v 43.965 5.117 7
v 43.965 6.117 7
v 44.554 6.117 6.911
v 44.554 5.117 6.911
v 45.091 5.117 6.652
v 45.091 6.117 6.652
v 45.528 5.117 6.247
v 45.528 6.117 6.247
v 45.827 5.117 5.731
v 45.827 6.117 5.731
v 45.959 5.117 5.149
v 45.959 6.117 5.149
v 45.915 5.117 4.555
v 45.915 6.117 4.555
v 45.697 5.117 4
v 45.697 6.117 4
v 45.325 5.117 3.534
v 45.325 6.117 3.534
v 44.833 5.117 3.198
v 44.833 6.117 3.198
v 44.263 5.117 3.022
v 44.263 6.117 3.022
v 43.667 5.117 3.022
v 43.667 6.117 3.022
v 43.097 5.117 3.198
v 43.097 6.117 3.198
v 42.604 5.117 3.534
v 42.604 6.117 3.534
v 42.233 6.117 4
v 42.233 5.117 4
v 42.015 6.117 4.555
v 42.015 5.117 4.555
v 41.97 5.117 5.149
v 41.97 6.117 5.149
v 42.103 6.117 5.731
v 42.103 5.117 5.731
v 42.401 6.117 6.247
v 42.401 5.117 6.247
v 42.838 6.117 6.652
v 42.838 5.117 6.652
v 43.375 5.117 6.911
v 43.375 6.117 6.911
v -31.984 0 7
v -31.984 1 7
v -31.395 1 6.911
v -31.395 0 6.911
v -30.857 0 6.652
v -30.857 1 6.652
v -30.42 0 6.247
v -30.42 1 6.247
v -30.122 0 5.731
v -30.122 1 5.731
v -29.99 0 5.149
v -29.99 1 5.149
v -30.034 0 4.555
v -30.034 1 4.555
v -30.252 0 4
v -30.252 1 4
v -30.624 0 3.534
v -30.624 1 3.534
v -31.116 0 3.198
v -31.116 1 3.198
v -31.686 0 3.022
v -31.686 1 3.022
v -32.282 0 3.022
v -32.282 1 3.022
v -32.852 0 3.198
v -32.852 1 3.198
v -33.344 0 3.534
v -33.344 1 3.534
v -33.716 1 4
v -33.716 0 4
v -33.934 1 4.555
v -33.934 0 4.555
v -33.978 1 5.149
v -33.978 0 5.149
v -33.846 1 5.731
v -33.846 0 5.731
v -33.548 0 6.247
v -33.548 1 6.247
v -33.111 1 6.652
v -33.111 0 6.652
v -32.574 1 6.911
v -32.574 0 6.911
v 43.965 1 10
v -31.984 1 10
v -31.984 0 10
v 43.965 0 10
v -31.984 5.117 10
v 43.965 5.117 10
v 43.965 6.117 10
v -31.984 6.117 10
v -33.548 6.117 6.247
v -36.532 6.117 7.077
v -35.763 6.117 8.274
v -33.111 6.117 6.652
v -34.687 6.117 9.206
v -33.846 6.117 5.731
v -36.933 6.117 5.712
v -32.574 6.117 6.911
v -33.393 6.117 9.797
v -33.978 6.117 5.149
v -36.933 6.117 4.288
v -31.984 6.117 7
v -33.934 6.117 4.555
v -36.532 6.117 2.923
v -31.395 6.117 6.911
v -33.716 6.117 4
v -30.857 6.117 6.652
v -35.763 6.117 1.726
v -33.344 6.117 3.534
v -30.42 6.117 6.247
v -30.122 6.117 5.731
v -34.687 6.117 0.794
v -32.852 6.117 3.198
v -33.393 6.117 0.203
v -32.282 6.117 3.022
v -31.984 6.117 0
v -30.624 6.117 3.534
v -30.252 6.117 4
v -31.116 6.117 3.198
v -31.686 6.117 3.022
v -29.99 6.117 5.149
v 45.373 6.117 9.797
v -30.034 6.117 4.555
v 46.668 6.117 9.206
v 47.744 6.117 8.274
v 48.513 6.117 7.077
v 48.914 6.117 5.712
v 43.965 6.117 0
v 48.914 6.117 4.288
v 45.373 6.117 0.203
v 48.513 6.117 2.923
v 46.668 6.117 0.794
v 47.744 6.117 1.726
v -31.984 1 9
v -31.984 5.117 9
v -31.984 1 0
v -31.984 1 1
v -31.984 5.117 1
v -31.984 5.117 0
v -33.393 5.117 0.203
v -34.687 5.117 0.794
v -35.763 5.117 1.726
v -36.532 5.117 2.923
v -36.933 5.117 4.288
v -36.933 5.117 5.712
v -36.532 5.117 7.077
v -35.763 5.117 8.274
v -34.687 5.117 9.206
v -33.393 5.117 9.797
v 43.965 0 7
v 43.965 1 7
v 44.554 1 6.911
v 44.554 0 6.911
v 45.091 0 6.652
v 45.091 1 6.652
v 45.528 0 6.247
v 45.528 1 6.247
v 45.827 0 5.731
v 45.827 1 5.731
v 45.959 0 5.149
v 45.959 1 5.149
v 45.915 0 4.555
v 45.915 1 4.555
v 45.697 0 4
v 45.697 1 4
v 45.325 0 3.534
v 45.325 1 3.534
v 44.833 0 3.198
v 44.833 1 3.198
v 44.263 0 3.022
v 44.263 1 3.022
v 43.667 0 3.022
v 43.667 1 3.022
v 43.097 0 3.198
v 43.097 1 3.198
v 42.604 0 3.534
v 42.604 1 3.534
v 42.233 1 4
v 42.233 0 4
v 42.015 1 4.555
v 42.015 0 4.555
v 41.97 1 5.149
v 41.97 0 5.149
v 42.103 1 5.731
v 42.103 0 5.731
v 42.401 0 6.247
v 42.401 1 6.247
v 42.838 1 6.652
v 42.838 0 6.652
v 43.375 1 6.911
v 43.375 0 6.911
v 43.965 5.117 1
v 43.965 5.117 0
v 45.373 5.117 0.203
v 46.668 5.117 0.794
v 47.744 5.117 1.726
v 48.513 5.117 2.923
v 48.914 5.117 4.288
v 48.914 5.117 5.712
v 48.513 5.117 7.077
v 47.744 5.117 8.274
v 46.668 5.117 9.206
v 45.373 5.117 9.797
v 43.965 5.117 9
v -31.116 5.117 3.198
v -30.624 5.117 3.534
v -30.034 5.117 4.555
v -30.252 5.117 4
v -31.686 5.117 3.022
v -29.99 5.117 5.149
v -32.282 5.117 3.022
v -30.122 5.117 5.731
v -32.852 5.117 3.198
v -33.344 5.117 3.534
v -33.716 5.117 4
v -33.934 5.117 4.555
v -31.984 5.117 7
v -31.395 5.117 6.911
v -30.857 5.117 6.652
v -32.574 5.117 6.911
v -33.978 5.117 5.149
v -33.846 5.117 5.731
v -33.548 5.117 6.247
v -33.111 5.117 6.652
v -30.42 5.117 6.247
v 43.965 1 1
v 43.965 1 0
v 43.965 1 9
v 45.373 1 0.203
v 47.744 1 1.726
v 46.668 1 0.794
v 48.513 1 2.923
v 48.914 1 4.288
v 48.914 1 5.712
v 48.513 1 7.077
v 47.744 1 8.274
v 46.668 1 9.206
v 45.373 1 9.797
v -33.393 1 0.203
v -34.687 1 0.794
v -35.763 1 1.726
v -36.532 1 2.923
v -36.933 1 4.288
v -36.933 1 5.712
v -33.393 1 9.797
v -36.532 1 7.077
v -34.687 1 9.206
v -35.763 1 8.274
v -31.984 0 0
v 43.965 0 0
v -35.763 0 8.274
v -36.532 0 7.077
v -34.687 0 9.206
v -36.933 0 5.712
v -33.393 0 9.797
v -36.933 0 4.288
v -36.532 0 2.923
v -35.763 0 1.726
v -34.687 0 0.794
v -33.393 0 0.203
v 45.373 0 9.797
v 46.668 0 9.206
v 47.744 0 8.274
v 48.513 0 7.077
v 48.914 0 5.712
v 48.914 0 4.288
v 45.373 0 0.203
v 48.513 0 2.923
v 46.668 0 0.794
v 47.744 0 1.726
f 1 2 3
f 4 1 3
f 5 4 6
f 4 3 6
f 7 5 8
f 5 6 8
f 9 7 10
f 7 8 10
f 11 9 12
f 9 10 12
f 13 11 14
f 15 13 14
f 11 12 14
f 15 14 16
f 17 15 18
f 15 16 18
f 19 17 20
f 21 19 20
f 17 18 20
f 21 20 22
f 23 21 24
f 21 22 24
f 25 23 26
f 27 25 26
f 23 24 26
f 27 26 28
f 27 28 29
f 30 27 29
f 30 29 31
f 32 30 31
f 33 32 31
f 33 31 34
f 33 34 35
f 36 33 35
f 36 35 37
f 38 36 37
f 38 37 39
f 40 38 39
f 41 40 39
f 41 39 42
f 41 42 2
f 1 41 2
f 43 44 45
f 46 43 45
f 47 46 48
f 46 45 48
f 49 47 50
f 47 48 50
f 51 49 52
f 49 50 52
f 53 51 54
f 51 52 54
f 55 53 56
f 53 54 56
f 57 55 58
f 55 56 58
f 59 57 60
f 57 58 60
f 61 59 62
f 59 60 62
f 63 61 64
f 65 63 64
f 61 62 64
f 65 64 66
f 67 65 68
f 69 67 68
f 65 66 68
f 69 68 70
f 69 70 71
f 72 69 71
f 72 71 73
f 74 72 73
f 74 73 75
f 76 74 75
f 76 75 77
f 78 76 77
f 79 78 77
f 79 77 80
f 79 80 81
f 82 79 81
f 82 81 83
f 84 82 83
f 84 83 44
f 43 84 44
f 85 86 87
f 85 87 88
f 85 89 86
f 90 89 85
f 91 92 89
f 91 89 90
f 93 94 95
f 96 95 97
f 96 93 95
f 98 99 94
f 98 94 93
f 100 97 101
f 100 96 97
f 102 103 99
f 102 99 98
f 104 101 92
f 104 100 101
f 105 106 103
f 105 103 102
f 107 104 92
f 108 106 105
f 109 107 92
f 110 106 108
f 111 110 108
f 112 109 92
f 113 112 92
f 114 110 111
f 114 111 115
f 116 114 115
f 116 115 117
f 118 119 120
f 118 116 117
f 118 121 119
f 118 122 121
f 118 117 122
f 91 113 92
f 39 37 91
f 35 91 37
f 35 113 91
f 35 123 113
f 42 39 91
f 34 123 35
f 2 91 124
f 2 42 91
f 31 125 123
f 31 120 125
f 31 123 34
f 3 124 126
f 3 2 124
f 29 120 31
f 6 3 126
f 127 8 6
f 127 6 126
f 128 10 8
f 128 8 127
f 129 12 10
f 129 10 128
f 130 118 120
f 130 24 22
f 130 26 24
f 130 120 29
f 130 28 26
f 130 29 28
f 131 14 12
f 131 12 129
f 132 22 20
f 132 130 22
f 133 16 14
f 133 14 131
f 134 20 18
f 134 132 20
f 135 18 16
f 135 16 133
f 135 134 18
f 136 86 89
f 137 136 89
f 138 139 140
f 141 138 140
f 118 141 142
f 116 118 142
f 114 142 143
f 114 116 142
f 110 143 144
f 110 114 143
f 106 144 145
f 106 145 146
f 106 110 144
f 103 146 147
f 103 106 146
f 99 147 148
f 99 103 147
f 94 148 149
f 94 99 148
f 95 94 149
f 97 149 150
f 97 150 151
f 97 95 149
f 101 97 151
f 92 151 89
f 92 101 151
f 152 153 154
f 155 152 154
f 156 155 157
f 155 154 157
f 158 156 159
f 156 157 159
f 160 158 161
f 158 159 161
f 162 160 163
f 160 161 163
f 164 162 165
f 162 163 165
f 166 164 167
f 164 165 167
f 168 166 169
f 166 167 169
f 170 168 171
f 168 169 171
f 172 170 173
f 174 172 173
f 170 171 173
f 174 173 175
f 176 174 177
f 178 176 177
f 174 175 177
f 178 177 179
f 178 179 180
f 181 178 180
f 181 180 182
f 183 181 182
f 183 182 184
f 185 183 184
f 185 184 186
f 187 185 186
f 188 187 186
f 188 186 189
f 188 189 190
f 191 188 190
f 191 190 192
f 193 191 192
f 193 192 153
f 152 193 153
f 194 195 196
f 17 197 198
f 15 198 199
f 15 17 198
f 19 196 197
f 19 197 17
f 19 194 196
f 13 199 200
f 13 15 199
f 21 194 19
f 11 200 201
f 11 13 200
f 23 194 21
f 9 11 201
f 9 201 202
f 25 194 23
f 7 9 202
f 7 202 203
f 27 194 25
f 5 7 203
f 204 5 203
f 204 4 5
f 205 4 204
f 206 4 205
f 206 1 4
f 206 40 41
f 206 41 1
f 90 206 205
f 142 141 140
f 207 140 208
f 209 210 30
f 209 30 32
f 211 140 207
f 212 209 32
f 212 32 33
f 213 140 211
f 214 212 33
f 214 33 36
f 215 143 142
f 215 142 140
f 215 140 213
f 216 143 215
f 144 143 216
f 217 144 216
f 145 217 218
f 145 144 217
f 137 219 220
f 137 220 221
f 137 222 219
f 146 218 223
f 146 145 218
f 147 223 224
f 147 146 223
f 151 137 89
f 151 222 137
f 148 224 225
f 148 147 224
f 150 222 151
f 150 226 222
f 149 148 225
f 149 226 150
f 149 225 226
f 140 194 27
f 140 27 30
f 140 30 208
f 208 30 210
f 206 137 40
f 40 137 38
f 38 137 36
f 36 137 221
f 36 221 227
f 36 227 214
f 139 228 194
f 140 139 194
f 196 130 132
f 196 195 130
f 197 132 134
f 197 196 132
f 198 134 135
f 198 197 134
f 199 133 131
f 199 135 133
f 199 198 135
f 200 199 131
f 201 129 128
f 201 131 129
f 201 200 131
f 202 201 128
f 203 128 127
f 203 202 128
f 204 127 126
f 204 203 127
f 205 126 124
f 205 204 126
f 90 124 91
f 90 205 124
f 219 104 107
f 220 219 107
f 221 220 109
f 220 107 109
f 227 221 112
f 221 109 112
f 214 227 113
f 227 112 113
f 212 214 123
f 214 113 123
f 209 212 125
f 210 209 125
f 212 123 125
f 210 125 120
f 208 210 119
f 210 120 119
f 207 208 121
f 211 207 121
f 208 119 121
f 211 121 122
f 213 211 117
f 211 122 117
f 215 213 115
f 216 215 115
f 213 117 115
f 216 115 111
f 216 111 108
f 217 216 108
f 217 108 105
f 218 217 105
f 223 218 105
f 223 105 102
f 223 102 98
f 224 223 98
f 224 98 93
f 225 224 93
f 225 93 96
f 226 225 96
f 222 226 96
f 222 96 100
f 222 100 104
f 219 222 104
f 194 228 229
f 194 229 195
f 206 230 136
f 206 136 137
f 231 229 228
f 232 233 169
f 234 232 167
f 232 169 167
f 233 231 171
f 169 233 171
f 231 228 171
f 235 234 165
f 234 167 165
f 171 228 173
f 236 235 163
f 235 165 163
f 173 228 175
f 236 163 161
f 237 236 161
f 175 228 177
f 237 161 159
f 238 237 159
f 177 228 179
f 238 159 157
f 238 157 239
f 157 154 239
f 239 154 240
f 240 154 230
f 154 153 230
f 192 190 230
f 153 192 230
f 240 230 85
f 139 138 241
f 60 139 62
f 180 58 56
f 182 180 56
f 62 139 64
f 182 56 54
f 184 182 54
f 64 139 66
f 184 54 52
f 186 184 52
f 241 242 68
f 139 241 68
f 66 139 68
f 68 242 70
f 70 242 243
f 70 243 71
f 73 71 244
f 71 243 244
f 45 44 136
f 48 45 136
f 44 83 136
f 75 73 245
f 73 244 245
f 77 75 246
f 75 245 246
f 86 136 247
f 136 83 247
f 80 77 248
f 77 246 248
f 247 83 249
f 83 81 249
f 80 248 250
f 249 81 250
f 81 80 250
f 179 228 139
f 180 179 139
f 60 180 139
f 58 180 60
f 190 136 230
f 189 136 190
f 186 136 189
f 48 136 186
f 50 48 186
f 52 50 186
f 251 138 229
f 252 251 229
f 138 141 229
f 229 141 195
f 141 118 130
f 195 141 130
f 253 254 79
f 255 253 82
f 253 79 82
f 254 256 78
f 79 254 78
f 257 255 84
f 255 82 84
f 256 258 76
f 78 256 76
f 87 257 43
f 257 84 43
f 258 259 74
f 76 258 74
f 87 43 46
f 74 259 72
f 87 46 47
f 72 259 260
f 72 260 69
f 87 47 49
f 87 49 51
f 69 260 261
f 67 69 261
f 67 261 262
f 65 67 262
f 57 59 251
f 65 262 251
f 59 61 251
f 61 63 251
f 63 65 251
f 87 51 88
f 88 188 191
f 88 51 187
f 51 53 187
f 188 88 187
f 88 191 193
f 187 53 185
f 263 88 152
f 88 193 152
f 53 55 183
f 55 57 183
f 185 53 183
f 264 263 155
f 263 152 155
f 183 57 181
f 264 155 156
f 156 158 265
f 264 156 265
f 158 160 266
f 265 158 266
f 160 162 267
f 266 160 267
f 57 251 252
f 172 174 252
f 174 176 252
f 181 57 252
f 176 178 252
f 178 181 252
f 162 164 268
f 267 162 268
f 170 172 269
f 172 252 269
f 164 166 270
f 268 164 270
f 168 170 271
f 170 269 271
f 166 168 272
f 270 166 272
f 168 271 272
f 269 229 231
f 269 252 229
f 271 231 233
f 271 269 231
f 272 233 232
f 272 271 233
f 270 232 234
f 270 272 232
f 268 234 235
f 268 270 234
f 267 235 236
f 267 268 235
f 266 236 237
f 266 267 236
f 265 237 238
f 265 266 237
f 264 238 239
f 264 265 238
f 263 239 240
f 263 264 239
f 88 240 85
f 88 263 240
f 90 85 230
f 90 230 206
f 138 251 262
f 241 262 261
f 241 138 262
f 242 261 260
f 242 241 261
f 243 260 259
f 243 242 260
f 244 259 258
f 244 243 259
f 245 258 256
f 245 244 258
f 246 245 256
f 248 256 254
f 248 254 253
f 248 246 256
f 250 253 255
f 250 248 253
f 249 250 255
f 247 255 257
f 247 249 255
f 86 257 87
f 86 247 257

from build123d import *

# Parameters (mm, degrees)
SKETCH1_W           = 85.948776221
SKETCH1_H           = 6.116753323
BOSS_EXTRUDE3_DEPTH = 10
FILLET1_RADIUS      = 5
FILLET1_LENGTH      = 6.116753323
FILLET2_RADIUS      = 5
FILLET2_LENGTH      = 6.116753323
SKETCH2_R           = 2
CUT_EXTRUDE1_DEPTH  = 10
SHELL4_START        = -36.984014516
SHELL4_OUTLINE_W    = 4.116753323
SHELL4_OUTLINE_H    = 8
SHELL4_DEPTH        = 85.948776221
SHELL4_START_2      = -36.983829274
SHELL4_2_OUTLINE_W  = 4.116753323
SHELL4_2_OUTLINE_H  = 2
SHELL4_2_DEPTH      = 4.999814758
SHELL4_START_3      = 43.964761705
SHELL4_3_OUTLINE_W  = 4.116753323
SHELL4_3_OUTLINE_H  = 2
SHELL4_3_DEPTH      = 4.999814758


# Read off the part's stored shape, not the designer's step: Shell4
with BuildPart() as part:
    # Sketch1 → Boss-Extrude3 (new body)
    with BuildSketch(Plane.XY):
        with Locations((5.990373594, 3.058376662)):
            Rectangle(SKETCH1_W, SKETCH1_H)
    extrude(amount=BOSS_EXTRUDE3_DEPTH)

    # Fillet1: full round fillet: the end face becomes a half cylinder, R = half its width
    fillet1_face = Plane((48.964761705, 3.058376662, 5), x_dir=(0, -1, 0), z_dir=(1, 0, 0))  # on the end face: x along it, z out of the body
    fillet1_slab = fillet1_face.offset(-FILLET1_RADIUS / 2) * Box(FILLET1_LENGTH, 2 * FILLET1_RADIUS, FILLET1_RADIUS, mode=Mode.PRIVATE)  # the body's end, R deep
    fillet1_round = Plane((43.964761705, 3.058376662, 5), x_dir=(1, 0, 0), z_dir=(0, -1, 0)) * Cylinder(FILLET1_RADIUS, FILLET1_LENGTH, mode=Mode.PRIVATE)  # its axis R under the face
    add(fillet1_slab - fillet1_round, mode=Mode.SUBTRACT)

    # Fillet2: full round fillet: the end face becomes a half cylinder, R = half its width
    fillet2_face = Plane((-36.984014516, 3.058376662, 5), x_dir=(0, 1, 0), z_dir=(-1, 0, 0))  # on the end face: x along it, z out of the body
    fillet2_slab = fillet2_face.offset(-FILLET2_RADIUS / 2) * Box(FILLET2_LENGTH, 2 * FILLET2_RADIUS, FILLET2_RADIUS, mode=Mode.PRIVATE)  # the body's end, R deep
    fillet2_round = Plane((-31.984014516, 3.058376662, 5), x_dir=(-1, 0, 0), z_dir=(0, 1, 0)) * Cylinder(FILLET2_RADIUS, FILLET2_LENGTH, mode=Mode.PRIVATE)  # its axis R under the face
    add(fillet2_slab - fillet2_round, mode=Mode.SUBTRACT)

    # Sketch2 → Cut-Extrude1 (cut)
    with BuildSketch(Plane(origin=(0, 6.116753323, 0), x_dir=(1, 0, 0), z_dir=(0, 1, 0))):
        with Locations(Location((43.964761705, -5, 0), (0, 0, 270))):
            Circle(SKETCH2_R)
        with Locations(Location((-31.984014516, -5, 0), (0, 0, 270))):
            Circle(SKETCH2_R)
    extrude(amount=-CUT_EXTRUDE1_DEPTH, mode=Mode.SUBTRACT)

    # Shell4 outline → Shell4 (cut)
    with BuildSketch(Plane.YZ.offset(SHELL4_START)):
        with Locations((3.058376662, 5)):
            Rectangle(SHELL4_OUTLINE_W, SHELL4_OUTLINE_H)
    extrude(amount=SHELL4_DEPTH, mode=Mode.SUBTRACT)

    # Shell4 2 outline → Shell4 2 (cut)
    with BuildSketch(Plane.YZ.offset(SHELL4_START_2)):
        with Locations((3.058376662, 0)):
            Rectangle(SHELL4_2_OUTLINE_W, SHELL4_2_OUTLINE_H)
        with Locations((3.058376662, 10)):
            Rectangle(SHELL4_2_OUTLINE_W, SHELL4_2_OUTLINE_H)
    extrude(amount=SHELL4_2_DEPTH, mode=Mode.SUBTRACT)

    # Shell4 3 outline → Shell4 3 (cut)
    with BuildSketch(Plane.YZ.offset(SHELL4_START_3)):
        with Locations((3.058376662, 0)):
            Rectangle(SHELL4_3_OUTLINE_W, SHELL4_3_OUTLINE_H)
        with Locations((3.058376662, 10)):
            Rectangle(SHELL4_3_OUTLINE_W, SHELL4_3_OUTLINE_H)
    extrude(amount=SHELL4_3_DEPTH, mode=Mode.SUBTRACT)


solid = part.part
